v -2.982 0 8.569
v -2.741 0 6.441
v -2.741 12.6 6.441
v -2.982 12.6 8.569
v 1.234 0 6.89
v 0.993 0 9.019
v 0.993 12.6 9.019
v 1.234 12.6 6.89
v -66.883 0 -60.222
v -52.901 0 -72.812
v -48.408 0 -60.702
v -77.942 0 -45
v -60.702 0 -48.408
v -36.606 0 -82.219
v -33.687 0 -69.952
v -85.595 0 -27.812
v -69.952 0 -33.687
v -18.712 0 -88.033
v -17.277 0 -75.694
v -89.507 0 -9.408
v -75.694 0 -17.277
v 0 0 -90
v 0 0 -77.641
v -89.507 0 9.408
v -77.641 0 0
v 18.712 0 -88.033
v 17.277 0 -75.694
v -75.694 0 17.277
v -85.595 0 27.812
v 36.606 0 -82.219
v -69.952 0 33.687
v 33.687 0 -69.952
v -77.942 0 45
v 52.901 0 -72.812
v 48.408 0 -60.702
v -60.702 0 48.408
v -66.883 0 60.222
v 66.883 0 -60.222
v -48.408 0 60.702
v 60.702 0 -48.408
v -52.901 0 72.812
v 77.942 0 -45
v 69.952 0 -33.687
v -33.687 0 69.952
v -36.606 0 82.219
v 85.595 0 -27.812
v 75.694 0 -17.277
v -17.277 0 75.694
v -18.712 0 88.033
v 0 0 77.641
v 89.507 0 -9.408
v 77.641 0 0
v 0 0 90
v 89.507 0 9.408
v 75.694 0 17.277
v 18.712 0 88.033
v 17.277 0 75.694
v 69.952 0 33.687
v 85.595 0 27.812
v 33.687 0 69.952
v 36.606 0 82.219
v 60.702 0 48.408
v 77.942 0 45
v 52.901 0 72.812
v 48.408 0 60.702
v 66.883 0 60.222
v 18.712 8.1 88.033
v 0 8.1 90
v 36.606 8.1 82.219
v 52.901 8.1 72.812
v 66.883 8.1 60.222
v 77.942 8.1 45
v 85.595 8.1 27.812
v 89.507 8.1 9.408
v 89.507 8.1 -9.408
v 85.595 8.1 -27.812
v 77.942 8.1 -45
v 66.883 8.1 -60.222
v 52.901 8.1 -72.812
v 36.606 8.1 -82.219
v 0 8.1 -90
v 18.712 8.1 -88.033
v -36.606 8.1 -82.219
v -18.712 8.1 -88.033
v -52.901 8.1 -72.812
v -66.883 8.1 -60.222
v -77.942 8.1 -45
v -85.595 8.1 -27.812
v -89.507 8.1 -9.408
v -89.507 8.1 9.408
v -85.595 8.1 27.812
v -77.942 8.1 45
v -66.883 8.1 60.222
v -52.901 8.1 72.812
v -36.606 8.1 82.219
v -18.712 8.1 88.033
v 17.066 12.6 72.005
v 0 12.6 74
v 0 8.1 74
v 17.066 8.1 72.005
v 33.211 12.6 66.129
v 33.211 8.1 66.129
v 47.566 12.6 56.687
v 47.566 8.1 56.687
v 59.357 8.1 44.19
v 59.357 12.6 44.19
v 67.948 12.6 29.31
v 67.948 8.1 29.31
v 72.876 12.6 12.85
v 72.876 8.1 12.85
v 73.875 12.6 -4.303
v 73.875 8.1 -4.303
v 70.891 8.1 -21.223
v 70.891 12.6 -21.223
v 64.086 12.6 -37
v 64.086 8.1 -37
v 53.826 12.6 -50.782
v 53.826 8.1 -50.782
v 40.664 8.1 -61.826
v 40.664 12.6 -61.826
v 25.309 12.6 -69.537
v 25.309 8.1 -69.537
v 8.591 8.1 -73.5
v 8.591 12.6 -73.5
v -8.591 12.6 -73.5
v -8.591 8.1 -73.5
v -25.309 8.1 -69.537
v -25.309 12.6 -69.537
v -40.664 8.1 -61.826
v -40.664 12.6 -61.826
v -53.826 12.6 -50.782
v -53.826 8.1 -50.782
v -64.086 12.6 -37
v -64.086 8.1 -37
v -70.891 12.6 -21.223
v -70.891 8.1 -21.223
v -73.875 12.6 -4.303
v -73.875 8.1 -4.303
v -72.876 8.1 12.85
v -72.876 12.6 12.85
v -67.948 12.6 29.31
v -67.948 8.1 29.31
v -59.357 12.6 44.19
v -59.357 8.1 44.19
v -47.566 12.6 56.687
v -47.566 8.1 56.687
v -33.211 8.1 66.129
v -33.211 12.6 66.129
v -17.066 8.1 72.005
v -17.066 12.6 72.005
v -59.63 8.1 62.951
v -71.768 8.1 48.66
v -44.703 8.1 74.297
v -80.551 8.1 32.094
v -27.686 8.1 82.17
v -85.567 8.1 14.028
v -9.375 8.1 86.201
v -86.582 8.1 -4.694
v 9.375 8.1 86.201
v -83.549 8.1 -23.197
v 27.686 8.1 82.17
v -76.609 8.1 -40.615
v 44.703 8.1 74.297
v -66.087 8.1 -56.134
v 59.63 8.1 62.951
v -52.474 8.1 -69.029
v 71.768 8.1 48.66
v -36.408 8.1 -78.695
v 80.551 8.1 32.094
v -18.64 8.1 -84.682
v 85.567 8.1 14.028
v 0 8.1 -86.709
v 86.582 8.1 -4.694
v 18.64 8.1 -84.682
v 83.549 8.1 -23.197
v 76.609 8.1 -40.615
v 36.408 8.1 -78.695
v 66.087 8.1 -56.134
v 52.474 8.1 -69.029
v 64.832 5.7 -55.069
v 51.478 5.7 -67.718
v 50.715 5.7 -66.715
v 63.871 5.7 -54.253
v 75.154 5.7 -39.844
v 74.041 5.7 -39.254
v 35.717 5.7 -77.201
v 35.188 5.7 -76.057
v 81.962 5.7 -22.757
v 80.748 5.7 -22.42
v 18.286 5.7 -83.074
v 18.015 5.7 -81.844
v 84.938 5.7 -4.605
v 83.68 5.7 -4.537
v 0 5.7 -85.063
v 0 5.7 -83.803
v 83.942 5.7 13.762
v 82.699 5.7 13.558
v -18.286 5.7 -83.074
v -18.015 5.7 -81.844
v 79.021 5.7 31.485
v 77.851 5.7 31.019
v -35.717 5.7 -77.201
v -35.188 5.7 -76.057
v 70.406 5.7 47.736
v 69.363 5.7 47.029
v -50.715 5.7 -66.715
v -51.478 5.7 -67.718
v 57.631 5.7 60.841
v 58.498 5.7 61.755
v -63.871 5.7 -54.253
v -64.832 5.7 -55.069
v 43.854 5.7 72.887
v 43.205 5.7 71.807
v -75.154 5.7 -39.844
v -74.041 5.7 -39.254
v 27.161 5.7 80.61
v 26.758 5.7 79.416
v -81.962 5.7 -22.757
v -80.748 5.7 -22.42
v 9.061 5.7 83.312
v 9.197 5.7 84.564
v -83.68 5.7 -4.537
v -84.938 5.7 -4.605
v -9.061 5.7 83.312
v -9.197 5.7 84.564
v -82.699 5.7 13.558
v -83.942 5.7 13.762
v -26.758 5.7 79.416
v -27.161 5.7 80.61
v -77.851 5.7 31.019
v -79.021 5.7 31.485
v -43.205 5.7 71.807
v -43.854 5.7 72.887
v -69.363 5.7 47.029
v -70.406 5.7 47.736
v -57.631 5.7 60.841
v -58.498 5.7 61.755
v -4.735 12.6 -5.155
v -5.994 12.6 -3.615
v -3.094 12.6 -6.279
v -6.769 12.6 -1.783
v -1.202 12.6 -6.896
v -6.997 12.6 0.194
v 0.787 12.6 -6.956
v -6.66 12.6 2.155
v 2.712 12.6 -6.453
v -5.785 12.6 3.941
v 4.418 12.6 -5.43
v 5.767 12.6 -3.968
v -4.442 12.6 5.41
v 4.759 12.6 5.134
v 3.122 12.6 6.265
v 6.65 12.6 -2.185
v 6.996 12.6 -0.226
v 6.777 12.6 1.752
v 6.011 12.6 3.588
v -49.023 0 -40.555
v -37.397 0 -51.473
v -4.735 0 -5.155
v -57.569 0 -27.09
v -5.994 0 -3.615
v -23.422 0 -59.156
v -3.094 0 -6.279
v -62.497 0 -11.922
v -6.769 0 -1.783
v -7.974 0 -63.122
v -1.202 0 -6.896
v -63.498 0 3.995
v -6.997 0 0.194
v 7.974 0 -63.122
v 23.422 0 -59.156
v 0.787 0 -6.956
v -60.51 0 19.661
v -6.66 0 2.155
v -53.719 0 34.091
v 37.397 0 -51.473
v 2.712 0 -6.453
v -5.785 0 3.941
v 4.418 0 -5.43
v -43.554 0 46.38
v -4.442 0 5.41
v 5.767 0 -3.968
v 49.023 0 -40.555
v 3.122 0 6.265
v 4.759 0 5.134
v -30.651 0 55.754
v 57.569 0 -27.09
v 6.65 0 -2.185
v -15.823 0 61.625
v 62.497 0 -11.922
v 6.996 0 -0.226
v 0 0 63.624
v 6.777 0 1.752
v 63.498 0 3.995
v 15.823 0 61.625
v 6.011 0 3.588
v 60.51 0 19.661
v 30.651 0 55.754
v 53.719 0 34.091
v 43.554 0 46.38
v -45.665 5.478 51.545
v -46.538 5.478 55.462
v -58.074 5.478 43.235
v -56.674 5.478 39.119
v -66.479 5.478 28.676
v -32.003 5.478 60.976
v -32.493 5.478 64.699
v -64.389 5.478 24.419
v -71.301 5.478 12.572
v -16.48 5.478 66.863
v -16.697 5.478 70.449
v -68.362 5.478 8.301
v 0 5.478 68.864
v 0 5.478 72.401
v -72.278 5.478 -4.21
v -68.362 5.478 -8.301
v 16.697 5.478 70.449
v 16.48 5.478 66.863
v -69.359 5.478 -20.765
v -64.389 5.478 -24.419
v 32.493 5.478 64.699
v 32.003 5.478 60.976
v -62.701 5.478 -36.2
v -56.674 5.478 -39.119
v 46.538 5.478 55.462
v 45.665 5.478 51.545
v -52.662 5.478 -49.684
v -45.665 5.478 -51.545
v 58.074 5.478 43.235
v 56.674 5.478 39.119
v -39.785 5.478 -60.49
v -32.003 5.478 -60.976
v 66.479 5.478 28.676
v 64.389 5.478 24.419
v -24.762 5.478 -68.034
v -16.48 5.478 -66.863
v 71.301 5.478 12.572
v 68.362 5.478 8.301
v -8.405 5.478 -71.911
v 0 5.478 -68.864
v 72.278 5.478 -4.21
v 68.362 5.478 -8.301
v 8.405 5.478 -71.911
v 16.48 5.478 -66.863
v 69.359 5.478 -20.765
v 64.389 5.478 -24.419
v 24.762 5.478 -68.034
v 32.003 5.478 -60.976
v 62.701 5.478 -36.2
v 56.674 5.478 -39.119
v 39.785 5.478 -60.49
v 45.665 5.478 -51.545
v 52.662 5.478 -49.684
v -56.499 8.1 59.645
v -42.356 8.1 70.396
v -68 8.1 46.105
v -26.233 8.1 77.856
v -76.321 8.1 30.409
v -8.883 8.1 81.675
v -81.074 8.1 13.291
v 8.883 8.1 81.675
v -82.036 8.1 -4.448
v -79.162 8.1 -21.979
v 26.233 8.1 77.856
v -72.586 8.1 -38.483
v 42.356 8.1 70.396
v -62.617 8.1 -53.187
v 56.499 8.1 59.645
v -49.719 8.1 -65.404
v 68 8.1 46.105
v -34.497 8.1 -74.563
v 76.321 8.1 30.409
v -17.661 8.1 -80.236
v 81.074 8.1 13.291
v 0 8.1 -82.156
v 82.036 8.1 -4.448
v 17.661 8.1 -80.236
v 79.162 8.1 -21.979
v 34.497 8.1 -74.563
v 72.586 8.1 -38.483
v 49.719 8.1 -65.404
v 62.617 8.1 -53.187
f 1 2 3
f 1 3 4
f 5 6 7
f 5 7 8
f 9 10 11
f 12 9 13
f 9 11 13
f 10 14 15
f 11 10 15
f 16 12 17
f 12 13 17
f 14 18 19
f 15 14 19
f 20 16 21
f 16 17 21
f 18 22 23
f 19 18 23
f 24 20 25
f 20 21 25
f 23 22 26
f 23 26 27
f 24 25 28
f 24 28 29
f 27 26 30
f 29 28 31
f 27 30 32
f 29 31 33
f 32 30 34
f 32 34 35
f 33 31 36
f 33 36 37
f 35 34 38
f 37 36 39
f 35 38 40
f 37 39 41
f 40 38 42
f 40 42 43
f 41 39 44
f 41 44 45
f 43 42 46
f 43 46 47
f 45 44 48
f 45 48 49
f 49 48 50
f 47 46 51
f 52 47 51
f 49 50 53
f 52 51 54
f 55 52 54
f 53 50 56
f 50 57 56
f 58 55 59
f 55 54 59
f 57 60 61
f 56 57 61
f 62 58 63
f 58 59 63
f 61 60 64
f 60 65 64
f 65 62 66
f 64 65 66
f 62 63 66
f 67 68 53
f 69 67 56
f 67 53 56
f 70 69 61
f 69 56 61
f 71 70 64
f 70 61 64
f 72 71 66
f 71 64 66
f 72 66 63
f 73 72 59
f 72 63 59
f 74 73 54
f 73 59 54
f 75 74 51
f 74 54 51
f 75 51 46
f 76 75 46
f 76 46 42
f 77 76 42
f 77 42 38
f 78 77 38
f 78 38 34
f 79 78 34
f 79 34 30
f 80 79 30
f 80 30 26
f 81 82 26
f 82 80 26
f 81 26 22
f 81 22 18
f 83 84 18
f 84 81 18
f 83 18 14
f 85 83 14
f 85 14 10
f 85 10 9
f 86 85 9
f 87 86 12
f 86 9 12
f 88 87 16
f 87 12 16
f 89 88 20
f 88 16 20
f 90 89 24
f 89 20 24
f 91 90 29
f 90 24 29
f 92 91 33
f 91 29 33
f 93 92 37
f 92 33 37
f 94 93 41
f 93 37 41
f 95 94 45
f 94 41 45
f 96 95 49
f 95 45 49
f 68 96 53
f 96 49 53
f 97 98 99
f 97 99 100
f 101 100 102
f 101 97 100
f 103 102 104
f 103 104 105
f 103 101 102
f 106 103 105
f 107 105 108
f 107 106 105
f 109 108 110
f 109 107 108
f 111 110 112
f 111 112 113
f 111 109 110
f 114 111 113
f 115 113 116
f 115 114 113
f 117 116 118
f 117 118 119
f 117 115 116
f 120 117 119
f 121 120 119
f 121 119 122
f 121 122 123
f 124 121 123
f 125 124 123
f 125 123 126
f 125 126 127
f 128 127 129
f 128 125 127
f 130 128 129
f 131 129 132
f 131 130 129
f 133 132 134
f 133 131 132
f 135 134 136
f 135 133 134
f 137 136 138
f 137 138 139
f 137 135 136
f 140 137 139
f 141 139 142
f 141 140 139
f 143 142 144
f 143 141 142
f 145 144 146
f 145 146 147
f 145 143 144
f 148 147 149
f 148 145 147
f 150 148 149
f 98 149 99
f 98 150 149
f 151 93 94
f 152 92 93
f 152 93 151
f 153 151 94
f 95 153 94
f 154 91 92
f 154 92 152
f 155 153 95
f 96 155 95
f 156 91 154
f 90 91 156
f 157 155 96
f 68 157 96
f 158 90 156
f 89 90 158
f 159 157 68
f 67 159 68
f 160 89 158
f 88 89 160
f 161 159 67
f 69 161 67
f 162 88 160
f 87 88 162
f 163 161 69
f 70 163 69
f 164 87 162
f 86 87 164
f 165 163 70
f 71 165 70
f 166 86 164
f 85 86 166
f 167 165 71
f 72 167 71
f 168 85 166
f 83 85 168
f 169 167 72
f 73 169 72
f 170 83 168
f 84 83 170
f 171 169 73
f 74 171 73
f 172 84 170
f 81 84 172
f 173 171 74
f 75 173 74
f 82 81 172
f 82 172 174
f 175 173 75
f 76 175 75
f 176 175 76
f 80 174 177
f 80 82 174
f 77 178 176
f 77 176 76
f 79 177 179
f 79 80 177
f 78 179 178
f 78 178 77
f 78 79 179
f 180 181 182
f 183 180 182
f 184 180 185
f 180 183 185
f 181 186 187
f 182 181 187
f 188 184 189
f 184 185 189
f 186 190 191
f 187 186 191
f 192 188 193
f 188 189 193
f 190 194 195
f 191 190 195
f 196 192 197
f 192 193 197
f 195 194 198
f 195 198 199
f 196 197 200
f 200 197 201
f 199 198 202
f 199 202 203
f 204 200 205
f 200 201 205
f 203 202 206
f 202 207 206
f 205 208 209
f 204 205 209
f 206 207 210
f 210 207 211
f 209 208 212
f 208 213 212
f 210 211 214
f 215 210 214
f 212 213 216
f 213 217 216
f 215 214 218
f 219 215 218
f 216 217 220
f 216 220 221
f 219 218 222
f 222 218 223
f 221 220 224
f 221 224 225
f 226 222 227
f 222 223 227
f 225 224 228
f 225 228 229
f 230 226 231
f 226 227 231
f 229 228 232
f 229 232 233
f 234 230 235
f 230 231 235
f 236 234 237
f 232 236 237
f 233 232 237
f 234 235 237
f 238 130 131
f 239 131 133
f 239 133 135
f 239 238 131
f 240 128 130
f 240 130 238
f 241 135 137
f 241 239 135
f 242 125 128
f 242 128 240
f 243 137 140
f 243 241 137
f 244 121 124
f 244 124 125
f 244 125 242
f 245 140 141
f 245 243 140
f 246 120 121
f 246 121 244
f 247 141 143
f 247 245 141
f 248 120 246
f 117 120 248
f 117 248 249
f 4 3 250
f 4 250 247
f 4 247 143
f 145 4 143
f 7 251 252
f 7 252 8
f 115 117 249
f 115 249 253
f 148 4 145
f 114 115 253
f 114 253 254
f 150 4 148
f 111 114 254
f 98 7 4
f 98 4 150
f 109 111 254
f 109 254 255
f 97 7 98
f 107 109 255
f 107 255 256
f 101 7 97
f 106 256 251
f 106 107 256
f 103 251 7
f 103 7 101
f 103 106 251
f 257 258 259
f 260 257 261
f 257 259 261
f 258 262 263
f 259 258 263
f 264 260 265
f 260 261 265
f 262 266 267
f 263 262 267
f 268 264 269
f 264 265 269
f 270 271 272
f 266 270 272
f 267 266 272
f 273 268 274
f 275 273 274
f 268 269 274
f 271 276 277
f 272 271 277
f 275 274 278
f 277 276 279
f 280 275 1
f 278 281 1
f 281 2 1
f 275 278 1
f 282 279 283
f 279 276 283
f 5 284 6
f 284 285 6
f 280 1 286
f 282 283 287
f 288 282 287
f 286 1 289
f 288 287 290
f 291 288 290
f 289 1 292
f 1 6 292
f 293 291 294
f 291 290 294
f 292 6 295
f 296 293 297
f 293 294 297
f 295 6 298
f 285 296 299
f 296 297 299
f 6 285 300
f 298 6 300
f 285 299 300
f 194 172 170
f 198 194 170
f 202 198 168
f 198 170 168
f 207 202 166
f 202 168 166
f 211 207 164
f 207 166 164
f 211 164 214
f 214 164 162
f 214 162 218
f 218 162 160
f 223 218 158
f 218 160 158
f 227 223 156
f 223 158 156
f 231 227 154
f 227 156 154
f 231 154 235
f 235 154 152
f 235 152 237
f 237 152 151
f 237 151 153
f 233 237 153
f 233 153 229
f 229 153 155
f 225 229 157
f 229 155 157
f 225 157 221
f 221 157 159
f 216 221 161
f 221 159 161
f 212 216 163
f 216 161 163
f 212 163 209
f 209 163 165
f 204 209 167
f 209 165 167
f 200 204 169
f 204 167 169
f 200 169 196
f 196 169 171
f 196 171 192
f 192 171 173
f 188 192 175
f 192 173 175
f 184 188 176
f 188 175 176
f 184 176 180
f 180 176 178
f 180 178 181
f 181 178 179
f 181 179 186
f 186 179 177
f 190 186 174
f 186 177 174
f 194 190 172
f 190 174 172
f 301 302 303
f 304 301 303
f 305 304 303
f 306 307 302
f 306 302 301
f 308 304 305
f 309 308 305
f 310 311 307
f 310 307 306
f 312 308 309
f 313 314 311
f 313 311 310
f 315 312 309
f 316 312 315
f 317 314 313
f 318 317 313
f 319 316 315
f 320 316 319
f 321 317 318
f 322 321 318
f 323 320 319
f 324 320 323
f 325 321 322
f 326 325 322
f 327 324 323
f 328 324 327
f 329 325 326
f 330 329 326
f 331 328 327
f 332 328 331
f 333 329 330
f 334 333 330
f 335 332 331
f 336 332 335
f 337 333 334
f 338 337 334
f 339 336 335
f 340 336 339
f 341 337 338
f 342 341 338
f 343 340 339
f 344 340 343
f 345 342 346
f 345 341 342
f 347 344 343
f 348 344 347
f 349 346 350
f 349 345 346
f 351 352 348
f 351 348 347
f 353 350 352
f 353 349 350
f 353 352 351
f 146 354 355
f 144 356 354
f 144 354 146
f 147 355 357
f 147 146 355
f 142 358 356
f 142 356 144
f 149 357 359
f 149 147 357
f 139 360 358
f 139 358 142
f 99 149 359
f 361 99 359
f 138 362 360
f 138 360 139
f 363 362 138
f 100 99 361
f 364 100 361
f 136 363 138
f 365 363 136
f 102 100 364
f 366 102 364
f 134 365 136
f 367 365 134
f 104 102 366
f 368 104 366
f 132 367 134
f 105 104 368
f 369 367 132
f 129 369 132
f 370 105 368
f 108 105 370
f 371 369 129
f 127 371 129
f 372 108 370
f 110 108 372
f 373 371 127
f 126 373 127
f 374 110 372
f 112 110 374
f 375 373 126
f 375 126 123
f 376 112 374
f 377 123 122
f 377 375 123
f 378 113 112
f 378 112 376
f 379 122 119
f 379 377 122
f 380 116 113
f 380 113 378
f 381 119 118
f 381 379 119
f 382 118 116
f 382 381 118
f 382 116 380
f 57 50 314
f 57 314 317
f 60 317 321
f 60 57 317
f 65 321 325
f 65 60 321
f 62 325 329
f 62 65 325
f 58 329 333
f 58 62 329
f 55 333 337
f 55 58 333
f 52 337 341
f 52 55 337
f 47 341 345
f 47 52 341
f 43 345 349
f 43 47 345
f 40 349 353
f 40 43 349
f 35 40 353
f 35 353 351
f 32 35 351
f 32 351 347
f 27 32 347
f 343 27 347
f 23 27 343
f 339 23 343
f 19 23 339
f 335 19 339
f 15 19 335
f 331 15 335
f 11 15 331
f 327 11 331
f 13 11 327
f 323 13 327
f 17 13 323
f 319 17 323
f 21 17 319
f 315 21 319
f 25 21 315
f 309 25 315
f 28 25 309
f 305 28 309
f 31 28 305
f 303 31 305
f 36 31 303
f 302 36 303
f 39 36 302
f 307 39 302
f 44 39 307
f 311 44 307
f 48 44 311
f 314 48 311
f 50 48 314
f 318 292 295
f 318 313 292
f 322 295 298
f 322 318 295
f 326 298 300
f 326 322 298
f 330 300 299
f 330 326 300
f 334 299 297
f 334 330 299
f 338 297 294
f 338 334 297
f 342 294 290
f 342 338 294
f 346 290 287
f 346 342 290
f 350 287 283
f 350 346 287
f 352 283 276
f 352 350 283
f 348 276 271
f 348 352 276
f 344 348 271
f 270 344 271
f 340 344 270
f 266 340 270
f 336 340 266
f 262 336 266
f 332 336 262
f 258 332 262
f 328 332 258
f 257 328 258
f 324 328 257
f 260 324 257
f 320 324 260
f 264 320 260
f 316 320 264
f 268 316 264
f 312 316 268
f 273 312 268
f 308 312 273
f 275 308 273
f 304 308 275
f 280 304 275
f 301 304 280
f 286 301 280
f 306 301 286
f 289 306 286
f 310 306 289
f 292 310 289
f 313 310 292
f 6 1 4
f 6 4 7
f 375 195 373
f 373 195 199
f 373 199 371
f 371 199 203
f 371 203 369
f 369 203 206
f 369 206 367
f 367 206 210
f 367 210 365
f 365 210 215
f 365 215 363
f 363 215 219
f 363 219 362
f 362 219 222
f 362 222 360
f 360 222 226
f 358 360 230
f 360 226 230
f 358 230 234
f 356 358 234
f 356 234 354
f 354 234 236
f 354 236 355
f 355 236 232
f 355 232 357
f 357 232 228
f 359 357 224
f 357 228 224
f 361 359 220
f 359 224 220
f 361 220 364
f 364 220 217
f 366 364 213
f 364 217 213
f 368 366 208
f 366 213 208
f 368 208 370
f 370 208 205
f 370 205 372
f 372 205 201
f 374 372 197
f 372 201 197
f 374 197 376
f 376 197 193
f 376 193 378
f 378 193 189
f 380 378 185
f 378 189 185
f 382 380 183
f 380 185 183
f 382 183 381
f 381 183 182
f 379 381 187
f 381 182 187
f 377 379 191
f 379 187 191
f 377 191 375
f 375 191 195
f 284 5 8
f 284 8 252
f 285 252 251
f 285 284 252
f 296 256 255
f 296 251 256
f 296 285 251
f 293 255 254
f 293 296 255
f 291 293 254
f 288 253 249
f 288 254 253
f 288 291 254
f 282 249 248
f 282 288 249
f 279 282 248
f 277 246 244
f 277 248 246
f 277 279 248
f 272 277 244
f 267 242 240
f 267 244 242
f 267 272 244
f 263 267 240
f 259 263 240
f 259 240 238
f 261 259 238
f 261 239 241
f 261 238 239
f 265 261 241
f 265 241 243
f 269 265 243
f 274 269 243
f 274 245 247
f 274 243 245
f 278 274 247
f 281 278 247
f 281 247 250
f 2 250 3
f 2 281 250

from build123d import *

# Parameters (mm, degrees)
SKETCH_1_R          = 90
EXTRUDE_1_DEPTH     = 12.6
CUT_EXTRUDE_2_DEPTH = 32
SKETCH_12_R         = 90.5
SKETCH_12_R_2       = 74
CUT_EXTRUDE_3_DEPTH = 4.5


with BuildPart() as part:
    # Эскиз1 → Вытянуть1 (new body)
    with BuildSketch(Plane(origin=(0, 0, 0), x_dir=(1, 0, 0), z_dir=(0, 1, 0))):
        with Locations(Location((0, 0, 0), (0, 0, 270))):
            Circle(SKETCH_1_R)
    extrude(amount=EXTRUDE_1_DEPTH)

    # Эскиз3 → Вырез-Вытянуть2 (cut)
    with BuildSketch(Plane.XZ):
        with BuildLine():
            Line((-2.741099481, 6.440991666), (-2.981761783, 8.569223808))
            Line((-2.981761783, 8.569223808), (0.992906346, 9.018682664))
            Line((0.992906346, 9.018682664), (1.233568648, 6.890450522))
            ThreePointArc((1.233568648, 6.890450522), (0.786552998, -6.955669226), (-2.741099481, 6.440991666))
        make_face()
    extrude(amount=-CUT_EXTRUDE_2_DEPTH, mode=Mode.SUBTRACT)

    # Эскиз4 → Вырез-Повернуть1 (revolve, cut)
    with BuildSketch(Plane.XY, mode=Mode.PRIVATE) as cut_revolve_1_sk:
        Polygon((68.863884992, 5.478404134), (72.400551948, 5.478404134), (77.896748421, -0.267847705), (63.367688519, -0.267847705), align=None)
    revolve(cut_revolve_1_sk.sketch.rotate(Axis((0, 80, 0), (0, 1, 0)), 270), axis=Axis((0, 80, 0), (0, 1, 0)), mode=Mode.SUBTRACT)

    # Эскиз7 → Вырез-Повернуть2 (revolve, cut)
    with BuildSketch(Plane.XY, mode=Mode.PRIVATE) as cut_revolve_2_sk:
        Polygon((85.06284255, 5.700411661), (87.617091847, 9.423063388), (81.248665283, 9.423063388), (83.802914581, 5.700411661), align=None)
    revolve(cut_revolve_2_sk.sketch.rotate(Axis((0, 0, 0), (0, 1, 0)), 90), axis=Axis((0, 0, 0), (0, 1, 0)), mode=Mode.SUBTRACT)

    # Эскиз12 → Вытянуть3 (cut)
    with BuildSketch(Plane(origin=(0, 12.6, 0), x_dir=(1, 0, 0), z_dir=(0, 1, 0))):
        Circle(SKETCH_12_R)
        with Locations(Location((0, 0, 0), (0, 0, 270))):
            Circle(SKETCH_12_R_2, mode=Mode.SUBTRACT)
    extrude(amount=-CUT_EXTRUDE_3_DEPTH, mode=Mode.SUBTRACT)


solid = part.part
